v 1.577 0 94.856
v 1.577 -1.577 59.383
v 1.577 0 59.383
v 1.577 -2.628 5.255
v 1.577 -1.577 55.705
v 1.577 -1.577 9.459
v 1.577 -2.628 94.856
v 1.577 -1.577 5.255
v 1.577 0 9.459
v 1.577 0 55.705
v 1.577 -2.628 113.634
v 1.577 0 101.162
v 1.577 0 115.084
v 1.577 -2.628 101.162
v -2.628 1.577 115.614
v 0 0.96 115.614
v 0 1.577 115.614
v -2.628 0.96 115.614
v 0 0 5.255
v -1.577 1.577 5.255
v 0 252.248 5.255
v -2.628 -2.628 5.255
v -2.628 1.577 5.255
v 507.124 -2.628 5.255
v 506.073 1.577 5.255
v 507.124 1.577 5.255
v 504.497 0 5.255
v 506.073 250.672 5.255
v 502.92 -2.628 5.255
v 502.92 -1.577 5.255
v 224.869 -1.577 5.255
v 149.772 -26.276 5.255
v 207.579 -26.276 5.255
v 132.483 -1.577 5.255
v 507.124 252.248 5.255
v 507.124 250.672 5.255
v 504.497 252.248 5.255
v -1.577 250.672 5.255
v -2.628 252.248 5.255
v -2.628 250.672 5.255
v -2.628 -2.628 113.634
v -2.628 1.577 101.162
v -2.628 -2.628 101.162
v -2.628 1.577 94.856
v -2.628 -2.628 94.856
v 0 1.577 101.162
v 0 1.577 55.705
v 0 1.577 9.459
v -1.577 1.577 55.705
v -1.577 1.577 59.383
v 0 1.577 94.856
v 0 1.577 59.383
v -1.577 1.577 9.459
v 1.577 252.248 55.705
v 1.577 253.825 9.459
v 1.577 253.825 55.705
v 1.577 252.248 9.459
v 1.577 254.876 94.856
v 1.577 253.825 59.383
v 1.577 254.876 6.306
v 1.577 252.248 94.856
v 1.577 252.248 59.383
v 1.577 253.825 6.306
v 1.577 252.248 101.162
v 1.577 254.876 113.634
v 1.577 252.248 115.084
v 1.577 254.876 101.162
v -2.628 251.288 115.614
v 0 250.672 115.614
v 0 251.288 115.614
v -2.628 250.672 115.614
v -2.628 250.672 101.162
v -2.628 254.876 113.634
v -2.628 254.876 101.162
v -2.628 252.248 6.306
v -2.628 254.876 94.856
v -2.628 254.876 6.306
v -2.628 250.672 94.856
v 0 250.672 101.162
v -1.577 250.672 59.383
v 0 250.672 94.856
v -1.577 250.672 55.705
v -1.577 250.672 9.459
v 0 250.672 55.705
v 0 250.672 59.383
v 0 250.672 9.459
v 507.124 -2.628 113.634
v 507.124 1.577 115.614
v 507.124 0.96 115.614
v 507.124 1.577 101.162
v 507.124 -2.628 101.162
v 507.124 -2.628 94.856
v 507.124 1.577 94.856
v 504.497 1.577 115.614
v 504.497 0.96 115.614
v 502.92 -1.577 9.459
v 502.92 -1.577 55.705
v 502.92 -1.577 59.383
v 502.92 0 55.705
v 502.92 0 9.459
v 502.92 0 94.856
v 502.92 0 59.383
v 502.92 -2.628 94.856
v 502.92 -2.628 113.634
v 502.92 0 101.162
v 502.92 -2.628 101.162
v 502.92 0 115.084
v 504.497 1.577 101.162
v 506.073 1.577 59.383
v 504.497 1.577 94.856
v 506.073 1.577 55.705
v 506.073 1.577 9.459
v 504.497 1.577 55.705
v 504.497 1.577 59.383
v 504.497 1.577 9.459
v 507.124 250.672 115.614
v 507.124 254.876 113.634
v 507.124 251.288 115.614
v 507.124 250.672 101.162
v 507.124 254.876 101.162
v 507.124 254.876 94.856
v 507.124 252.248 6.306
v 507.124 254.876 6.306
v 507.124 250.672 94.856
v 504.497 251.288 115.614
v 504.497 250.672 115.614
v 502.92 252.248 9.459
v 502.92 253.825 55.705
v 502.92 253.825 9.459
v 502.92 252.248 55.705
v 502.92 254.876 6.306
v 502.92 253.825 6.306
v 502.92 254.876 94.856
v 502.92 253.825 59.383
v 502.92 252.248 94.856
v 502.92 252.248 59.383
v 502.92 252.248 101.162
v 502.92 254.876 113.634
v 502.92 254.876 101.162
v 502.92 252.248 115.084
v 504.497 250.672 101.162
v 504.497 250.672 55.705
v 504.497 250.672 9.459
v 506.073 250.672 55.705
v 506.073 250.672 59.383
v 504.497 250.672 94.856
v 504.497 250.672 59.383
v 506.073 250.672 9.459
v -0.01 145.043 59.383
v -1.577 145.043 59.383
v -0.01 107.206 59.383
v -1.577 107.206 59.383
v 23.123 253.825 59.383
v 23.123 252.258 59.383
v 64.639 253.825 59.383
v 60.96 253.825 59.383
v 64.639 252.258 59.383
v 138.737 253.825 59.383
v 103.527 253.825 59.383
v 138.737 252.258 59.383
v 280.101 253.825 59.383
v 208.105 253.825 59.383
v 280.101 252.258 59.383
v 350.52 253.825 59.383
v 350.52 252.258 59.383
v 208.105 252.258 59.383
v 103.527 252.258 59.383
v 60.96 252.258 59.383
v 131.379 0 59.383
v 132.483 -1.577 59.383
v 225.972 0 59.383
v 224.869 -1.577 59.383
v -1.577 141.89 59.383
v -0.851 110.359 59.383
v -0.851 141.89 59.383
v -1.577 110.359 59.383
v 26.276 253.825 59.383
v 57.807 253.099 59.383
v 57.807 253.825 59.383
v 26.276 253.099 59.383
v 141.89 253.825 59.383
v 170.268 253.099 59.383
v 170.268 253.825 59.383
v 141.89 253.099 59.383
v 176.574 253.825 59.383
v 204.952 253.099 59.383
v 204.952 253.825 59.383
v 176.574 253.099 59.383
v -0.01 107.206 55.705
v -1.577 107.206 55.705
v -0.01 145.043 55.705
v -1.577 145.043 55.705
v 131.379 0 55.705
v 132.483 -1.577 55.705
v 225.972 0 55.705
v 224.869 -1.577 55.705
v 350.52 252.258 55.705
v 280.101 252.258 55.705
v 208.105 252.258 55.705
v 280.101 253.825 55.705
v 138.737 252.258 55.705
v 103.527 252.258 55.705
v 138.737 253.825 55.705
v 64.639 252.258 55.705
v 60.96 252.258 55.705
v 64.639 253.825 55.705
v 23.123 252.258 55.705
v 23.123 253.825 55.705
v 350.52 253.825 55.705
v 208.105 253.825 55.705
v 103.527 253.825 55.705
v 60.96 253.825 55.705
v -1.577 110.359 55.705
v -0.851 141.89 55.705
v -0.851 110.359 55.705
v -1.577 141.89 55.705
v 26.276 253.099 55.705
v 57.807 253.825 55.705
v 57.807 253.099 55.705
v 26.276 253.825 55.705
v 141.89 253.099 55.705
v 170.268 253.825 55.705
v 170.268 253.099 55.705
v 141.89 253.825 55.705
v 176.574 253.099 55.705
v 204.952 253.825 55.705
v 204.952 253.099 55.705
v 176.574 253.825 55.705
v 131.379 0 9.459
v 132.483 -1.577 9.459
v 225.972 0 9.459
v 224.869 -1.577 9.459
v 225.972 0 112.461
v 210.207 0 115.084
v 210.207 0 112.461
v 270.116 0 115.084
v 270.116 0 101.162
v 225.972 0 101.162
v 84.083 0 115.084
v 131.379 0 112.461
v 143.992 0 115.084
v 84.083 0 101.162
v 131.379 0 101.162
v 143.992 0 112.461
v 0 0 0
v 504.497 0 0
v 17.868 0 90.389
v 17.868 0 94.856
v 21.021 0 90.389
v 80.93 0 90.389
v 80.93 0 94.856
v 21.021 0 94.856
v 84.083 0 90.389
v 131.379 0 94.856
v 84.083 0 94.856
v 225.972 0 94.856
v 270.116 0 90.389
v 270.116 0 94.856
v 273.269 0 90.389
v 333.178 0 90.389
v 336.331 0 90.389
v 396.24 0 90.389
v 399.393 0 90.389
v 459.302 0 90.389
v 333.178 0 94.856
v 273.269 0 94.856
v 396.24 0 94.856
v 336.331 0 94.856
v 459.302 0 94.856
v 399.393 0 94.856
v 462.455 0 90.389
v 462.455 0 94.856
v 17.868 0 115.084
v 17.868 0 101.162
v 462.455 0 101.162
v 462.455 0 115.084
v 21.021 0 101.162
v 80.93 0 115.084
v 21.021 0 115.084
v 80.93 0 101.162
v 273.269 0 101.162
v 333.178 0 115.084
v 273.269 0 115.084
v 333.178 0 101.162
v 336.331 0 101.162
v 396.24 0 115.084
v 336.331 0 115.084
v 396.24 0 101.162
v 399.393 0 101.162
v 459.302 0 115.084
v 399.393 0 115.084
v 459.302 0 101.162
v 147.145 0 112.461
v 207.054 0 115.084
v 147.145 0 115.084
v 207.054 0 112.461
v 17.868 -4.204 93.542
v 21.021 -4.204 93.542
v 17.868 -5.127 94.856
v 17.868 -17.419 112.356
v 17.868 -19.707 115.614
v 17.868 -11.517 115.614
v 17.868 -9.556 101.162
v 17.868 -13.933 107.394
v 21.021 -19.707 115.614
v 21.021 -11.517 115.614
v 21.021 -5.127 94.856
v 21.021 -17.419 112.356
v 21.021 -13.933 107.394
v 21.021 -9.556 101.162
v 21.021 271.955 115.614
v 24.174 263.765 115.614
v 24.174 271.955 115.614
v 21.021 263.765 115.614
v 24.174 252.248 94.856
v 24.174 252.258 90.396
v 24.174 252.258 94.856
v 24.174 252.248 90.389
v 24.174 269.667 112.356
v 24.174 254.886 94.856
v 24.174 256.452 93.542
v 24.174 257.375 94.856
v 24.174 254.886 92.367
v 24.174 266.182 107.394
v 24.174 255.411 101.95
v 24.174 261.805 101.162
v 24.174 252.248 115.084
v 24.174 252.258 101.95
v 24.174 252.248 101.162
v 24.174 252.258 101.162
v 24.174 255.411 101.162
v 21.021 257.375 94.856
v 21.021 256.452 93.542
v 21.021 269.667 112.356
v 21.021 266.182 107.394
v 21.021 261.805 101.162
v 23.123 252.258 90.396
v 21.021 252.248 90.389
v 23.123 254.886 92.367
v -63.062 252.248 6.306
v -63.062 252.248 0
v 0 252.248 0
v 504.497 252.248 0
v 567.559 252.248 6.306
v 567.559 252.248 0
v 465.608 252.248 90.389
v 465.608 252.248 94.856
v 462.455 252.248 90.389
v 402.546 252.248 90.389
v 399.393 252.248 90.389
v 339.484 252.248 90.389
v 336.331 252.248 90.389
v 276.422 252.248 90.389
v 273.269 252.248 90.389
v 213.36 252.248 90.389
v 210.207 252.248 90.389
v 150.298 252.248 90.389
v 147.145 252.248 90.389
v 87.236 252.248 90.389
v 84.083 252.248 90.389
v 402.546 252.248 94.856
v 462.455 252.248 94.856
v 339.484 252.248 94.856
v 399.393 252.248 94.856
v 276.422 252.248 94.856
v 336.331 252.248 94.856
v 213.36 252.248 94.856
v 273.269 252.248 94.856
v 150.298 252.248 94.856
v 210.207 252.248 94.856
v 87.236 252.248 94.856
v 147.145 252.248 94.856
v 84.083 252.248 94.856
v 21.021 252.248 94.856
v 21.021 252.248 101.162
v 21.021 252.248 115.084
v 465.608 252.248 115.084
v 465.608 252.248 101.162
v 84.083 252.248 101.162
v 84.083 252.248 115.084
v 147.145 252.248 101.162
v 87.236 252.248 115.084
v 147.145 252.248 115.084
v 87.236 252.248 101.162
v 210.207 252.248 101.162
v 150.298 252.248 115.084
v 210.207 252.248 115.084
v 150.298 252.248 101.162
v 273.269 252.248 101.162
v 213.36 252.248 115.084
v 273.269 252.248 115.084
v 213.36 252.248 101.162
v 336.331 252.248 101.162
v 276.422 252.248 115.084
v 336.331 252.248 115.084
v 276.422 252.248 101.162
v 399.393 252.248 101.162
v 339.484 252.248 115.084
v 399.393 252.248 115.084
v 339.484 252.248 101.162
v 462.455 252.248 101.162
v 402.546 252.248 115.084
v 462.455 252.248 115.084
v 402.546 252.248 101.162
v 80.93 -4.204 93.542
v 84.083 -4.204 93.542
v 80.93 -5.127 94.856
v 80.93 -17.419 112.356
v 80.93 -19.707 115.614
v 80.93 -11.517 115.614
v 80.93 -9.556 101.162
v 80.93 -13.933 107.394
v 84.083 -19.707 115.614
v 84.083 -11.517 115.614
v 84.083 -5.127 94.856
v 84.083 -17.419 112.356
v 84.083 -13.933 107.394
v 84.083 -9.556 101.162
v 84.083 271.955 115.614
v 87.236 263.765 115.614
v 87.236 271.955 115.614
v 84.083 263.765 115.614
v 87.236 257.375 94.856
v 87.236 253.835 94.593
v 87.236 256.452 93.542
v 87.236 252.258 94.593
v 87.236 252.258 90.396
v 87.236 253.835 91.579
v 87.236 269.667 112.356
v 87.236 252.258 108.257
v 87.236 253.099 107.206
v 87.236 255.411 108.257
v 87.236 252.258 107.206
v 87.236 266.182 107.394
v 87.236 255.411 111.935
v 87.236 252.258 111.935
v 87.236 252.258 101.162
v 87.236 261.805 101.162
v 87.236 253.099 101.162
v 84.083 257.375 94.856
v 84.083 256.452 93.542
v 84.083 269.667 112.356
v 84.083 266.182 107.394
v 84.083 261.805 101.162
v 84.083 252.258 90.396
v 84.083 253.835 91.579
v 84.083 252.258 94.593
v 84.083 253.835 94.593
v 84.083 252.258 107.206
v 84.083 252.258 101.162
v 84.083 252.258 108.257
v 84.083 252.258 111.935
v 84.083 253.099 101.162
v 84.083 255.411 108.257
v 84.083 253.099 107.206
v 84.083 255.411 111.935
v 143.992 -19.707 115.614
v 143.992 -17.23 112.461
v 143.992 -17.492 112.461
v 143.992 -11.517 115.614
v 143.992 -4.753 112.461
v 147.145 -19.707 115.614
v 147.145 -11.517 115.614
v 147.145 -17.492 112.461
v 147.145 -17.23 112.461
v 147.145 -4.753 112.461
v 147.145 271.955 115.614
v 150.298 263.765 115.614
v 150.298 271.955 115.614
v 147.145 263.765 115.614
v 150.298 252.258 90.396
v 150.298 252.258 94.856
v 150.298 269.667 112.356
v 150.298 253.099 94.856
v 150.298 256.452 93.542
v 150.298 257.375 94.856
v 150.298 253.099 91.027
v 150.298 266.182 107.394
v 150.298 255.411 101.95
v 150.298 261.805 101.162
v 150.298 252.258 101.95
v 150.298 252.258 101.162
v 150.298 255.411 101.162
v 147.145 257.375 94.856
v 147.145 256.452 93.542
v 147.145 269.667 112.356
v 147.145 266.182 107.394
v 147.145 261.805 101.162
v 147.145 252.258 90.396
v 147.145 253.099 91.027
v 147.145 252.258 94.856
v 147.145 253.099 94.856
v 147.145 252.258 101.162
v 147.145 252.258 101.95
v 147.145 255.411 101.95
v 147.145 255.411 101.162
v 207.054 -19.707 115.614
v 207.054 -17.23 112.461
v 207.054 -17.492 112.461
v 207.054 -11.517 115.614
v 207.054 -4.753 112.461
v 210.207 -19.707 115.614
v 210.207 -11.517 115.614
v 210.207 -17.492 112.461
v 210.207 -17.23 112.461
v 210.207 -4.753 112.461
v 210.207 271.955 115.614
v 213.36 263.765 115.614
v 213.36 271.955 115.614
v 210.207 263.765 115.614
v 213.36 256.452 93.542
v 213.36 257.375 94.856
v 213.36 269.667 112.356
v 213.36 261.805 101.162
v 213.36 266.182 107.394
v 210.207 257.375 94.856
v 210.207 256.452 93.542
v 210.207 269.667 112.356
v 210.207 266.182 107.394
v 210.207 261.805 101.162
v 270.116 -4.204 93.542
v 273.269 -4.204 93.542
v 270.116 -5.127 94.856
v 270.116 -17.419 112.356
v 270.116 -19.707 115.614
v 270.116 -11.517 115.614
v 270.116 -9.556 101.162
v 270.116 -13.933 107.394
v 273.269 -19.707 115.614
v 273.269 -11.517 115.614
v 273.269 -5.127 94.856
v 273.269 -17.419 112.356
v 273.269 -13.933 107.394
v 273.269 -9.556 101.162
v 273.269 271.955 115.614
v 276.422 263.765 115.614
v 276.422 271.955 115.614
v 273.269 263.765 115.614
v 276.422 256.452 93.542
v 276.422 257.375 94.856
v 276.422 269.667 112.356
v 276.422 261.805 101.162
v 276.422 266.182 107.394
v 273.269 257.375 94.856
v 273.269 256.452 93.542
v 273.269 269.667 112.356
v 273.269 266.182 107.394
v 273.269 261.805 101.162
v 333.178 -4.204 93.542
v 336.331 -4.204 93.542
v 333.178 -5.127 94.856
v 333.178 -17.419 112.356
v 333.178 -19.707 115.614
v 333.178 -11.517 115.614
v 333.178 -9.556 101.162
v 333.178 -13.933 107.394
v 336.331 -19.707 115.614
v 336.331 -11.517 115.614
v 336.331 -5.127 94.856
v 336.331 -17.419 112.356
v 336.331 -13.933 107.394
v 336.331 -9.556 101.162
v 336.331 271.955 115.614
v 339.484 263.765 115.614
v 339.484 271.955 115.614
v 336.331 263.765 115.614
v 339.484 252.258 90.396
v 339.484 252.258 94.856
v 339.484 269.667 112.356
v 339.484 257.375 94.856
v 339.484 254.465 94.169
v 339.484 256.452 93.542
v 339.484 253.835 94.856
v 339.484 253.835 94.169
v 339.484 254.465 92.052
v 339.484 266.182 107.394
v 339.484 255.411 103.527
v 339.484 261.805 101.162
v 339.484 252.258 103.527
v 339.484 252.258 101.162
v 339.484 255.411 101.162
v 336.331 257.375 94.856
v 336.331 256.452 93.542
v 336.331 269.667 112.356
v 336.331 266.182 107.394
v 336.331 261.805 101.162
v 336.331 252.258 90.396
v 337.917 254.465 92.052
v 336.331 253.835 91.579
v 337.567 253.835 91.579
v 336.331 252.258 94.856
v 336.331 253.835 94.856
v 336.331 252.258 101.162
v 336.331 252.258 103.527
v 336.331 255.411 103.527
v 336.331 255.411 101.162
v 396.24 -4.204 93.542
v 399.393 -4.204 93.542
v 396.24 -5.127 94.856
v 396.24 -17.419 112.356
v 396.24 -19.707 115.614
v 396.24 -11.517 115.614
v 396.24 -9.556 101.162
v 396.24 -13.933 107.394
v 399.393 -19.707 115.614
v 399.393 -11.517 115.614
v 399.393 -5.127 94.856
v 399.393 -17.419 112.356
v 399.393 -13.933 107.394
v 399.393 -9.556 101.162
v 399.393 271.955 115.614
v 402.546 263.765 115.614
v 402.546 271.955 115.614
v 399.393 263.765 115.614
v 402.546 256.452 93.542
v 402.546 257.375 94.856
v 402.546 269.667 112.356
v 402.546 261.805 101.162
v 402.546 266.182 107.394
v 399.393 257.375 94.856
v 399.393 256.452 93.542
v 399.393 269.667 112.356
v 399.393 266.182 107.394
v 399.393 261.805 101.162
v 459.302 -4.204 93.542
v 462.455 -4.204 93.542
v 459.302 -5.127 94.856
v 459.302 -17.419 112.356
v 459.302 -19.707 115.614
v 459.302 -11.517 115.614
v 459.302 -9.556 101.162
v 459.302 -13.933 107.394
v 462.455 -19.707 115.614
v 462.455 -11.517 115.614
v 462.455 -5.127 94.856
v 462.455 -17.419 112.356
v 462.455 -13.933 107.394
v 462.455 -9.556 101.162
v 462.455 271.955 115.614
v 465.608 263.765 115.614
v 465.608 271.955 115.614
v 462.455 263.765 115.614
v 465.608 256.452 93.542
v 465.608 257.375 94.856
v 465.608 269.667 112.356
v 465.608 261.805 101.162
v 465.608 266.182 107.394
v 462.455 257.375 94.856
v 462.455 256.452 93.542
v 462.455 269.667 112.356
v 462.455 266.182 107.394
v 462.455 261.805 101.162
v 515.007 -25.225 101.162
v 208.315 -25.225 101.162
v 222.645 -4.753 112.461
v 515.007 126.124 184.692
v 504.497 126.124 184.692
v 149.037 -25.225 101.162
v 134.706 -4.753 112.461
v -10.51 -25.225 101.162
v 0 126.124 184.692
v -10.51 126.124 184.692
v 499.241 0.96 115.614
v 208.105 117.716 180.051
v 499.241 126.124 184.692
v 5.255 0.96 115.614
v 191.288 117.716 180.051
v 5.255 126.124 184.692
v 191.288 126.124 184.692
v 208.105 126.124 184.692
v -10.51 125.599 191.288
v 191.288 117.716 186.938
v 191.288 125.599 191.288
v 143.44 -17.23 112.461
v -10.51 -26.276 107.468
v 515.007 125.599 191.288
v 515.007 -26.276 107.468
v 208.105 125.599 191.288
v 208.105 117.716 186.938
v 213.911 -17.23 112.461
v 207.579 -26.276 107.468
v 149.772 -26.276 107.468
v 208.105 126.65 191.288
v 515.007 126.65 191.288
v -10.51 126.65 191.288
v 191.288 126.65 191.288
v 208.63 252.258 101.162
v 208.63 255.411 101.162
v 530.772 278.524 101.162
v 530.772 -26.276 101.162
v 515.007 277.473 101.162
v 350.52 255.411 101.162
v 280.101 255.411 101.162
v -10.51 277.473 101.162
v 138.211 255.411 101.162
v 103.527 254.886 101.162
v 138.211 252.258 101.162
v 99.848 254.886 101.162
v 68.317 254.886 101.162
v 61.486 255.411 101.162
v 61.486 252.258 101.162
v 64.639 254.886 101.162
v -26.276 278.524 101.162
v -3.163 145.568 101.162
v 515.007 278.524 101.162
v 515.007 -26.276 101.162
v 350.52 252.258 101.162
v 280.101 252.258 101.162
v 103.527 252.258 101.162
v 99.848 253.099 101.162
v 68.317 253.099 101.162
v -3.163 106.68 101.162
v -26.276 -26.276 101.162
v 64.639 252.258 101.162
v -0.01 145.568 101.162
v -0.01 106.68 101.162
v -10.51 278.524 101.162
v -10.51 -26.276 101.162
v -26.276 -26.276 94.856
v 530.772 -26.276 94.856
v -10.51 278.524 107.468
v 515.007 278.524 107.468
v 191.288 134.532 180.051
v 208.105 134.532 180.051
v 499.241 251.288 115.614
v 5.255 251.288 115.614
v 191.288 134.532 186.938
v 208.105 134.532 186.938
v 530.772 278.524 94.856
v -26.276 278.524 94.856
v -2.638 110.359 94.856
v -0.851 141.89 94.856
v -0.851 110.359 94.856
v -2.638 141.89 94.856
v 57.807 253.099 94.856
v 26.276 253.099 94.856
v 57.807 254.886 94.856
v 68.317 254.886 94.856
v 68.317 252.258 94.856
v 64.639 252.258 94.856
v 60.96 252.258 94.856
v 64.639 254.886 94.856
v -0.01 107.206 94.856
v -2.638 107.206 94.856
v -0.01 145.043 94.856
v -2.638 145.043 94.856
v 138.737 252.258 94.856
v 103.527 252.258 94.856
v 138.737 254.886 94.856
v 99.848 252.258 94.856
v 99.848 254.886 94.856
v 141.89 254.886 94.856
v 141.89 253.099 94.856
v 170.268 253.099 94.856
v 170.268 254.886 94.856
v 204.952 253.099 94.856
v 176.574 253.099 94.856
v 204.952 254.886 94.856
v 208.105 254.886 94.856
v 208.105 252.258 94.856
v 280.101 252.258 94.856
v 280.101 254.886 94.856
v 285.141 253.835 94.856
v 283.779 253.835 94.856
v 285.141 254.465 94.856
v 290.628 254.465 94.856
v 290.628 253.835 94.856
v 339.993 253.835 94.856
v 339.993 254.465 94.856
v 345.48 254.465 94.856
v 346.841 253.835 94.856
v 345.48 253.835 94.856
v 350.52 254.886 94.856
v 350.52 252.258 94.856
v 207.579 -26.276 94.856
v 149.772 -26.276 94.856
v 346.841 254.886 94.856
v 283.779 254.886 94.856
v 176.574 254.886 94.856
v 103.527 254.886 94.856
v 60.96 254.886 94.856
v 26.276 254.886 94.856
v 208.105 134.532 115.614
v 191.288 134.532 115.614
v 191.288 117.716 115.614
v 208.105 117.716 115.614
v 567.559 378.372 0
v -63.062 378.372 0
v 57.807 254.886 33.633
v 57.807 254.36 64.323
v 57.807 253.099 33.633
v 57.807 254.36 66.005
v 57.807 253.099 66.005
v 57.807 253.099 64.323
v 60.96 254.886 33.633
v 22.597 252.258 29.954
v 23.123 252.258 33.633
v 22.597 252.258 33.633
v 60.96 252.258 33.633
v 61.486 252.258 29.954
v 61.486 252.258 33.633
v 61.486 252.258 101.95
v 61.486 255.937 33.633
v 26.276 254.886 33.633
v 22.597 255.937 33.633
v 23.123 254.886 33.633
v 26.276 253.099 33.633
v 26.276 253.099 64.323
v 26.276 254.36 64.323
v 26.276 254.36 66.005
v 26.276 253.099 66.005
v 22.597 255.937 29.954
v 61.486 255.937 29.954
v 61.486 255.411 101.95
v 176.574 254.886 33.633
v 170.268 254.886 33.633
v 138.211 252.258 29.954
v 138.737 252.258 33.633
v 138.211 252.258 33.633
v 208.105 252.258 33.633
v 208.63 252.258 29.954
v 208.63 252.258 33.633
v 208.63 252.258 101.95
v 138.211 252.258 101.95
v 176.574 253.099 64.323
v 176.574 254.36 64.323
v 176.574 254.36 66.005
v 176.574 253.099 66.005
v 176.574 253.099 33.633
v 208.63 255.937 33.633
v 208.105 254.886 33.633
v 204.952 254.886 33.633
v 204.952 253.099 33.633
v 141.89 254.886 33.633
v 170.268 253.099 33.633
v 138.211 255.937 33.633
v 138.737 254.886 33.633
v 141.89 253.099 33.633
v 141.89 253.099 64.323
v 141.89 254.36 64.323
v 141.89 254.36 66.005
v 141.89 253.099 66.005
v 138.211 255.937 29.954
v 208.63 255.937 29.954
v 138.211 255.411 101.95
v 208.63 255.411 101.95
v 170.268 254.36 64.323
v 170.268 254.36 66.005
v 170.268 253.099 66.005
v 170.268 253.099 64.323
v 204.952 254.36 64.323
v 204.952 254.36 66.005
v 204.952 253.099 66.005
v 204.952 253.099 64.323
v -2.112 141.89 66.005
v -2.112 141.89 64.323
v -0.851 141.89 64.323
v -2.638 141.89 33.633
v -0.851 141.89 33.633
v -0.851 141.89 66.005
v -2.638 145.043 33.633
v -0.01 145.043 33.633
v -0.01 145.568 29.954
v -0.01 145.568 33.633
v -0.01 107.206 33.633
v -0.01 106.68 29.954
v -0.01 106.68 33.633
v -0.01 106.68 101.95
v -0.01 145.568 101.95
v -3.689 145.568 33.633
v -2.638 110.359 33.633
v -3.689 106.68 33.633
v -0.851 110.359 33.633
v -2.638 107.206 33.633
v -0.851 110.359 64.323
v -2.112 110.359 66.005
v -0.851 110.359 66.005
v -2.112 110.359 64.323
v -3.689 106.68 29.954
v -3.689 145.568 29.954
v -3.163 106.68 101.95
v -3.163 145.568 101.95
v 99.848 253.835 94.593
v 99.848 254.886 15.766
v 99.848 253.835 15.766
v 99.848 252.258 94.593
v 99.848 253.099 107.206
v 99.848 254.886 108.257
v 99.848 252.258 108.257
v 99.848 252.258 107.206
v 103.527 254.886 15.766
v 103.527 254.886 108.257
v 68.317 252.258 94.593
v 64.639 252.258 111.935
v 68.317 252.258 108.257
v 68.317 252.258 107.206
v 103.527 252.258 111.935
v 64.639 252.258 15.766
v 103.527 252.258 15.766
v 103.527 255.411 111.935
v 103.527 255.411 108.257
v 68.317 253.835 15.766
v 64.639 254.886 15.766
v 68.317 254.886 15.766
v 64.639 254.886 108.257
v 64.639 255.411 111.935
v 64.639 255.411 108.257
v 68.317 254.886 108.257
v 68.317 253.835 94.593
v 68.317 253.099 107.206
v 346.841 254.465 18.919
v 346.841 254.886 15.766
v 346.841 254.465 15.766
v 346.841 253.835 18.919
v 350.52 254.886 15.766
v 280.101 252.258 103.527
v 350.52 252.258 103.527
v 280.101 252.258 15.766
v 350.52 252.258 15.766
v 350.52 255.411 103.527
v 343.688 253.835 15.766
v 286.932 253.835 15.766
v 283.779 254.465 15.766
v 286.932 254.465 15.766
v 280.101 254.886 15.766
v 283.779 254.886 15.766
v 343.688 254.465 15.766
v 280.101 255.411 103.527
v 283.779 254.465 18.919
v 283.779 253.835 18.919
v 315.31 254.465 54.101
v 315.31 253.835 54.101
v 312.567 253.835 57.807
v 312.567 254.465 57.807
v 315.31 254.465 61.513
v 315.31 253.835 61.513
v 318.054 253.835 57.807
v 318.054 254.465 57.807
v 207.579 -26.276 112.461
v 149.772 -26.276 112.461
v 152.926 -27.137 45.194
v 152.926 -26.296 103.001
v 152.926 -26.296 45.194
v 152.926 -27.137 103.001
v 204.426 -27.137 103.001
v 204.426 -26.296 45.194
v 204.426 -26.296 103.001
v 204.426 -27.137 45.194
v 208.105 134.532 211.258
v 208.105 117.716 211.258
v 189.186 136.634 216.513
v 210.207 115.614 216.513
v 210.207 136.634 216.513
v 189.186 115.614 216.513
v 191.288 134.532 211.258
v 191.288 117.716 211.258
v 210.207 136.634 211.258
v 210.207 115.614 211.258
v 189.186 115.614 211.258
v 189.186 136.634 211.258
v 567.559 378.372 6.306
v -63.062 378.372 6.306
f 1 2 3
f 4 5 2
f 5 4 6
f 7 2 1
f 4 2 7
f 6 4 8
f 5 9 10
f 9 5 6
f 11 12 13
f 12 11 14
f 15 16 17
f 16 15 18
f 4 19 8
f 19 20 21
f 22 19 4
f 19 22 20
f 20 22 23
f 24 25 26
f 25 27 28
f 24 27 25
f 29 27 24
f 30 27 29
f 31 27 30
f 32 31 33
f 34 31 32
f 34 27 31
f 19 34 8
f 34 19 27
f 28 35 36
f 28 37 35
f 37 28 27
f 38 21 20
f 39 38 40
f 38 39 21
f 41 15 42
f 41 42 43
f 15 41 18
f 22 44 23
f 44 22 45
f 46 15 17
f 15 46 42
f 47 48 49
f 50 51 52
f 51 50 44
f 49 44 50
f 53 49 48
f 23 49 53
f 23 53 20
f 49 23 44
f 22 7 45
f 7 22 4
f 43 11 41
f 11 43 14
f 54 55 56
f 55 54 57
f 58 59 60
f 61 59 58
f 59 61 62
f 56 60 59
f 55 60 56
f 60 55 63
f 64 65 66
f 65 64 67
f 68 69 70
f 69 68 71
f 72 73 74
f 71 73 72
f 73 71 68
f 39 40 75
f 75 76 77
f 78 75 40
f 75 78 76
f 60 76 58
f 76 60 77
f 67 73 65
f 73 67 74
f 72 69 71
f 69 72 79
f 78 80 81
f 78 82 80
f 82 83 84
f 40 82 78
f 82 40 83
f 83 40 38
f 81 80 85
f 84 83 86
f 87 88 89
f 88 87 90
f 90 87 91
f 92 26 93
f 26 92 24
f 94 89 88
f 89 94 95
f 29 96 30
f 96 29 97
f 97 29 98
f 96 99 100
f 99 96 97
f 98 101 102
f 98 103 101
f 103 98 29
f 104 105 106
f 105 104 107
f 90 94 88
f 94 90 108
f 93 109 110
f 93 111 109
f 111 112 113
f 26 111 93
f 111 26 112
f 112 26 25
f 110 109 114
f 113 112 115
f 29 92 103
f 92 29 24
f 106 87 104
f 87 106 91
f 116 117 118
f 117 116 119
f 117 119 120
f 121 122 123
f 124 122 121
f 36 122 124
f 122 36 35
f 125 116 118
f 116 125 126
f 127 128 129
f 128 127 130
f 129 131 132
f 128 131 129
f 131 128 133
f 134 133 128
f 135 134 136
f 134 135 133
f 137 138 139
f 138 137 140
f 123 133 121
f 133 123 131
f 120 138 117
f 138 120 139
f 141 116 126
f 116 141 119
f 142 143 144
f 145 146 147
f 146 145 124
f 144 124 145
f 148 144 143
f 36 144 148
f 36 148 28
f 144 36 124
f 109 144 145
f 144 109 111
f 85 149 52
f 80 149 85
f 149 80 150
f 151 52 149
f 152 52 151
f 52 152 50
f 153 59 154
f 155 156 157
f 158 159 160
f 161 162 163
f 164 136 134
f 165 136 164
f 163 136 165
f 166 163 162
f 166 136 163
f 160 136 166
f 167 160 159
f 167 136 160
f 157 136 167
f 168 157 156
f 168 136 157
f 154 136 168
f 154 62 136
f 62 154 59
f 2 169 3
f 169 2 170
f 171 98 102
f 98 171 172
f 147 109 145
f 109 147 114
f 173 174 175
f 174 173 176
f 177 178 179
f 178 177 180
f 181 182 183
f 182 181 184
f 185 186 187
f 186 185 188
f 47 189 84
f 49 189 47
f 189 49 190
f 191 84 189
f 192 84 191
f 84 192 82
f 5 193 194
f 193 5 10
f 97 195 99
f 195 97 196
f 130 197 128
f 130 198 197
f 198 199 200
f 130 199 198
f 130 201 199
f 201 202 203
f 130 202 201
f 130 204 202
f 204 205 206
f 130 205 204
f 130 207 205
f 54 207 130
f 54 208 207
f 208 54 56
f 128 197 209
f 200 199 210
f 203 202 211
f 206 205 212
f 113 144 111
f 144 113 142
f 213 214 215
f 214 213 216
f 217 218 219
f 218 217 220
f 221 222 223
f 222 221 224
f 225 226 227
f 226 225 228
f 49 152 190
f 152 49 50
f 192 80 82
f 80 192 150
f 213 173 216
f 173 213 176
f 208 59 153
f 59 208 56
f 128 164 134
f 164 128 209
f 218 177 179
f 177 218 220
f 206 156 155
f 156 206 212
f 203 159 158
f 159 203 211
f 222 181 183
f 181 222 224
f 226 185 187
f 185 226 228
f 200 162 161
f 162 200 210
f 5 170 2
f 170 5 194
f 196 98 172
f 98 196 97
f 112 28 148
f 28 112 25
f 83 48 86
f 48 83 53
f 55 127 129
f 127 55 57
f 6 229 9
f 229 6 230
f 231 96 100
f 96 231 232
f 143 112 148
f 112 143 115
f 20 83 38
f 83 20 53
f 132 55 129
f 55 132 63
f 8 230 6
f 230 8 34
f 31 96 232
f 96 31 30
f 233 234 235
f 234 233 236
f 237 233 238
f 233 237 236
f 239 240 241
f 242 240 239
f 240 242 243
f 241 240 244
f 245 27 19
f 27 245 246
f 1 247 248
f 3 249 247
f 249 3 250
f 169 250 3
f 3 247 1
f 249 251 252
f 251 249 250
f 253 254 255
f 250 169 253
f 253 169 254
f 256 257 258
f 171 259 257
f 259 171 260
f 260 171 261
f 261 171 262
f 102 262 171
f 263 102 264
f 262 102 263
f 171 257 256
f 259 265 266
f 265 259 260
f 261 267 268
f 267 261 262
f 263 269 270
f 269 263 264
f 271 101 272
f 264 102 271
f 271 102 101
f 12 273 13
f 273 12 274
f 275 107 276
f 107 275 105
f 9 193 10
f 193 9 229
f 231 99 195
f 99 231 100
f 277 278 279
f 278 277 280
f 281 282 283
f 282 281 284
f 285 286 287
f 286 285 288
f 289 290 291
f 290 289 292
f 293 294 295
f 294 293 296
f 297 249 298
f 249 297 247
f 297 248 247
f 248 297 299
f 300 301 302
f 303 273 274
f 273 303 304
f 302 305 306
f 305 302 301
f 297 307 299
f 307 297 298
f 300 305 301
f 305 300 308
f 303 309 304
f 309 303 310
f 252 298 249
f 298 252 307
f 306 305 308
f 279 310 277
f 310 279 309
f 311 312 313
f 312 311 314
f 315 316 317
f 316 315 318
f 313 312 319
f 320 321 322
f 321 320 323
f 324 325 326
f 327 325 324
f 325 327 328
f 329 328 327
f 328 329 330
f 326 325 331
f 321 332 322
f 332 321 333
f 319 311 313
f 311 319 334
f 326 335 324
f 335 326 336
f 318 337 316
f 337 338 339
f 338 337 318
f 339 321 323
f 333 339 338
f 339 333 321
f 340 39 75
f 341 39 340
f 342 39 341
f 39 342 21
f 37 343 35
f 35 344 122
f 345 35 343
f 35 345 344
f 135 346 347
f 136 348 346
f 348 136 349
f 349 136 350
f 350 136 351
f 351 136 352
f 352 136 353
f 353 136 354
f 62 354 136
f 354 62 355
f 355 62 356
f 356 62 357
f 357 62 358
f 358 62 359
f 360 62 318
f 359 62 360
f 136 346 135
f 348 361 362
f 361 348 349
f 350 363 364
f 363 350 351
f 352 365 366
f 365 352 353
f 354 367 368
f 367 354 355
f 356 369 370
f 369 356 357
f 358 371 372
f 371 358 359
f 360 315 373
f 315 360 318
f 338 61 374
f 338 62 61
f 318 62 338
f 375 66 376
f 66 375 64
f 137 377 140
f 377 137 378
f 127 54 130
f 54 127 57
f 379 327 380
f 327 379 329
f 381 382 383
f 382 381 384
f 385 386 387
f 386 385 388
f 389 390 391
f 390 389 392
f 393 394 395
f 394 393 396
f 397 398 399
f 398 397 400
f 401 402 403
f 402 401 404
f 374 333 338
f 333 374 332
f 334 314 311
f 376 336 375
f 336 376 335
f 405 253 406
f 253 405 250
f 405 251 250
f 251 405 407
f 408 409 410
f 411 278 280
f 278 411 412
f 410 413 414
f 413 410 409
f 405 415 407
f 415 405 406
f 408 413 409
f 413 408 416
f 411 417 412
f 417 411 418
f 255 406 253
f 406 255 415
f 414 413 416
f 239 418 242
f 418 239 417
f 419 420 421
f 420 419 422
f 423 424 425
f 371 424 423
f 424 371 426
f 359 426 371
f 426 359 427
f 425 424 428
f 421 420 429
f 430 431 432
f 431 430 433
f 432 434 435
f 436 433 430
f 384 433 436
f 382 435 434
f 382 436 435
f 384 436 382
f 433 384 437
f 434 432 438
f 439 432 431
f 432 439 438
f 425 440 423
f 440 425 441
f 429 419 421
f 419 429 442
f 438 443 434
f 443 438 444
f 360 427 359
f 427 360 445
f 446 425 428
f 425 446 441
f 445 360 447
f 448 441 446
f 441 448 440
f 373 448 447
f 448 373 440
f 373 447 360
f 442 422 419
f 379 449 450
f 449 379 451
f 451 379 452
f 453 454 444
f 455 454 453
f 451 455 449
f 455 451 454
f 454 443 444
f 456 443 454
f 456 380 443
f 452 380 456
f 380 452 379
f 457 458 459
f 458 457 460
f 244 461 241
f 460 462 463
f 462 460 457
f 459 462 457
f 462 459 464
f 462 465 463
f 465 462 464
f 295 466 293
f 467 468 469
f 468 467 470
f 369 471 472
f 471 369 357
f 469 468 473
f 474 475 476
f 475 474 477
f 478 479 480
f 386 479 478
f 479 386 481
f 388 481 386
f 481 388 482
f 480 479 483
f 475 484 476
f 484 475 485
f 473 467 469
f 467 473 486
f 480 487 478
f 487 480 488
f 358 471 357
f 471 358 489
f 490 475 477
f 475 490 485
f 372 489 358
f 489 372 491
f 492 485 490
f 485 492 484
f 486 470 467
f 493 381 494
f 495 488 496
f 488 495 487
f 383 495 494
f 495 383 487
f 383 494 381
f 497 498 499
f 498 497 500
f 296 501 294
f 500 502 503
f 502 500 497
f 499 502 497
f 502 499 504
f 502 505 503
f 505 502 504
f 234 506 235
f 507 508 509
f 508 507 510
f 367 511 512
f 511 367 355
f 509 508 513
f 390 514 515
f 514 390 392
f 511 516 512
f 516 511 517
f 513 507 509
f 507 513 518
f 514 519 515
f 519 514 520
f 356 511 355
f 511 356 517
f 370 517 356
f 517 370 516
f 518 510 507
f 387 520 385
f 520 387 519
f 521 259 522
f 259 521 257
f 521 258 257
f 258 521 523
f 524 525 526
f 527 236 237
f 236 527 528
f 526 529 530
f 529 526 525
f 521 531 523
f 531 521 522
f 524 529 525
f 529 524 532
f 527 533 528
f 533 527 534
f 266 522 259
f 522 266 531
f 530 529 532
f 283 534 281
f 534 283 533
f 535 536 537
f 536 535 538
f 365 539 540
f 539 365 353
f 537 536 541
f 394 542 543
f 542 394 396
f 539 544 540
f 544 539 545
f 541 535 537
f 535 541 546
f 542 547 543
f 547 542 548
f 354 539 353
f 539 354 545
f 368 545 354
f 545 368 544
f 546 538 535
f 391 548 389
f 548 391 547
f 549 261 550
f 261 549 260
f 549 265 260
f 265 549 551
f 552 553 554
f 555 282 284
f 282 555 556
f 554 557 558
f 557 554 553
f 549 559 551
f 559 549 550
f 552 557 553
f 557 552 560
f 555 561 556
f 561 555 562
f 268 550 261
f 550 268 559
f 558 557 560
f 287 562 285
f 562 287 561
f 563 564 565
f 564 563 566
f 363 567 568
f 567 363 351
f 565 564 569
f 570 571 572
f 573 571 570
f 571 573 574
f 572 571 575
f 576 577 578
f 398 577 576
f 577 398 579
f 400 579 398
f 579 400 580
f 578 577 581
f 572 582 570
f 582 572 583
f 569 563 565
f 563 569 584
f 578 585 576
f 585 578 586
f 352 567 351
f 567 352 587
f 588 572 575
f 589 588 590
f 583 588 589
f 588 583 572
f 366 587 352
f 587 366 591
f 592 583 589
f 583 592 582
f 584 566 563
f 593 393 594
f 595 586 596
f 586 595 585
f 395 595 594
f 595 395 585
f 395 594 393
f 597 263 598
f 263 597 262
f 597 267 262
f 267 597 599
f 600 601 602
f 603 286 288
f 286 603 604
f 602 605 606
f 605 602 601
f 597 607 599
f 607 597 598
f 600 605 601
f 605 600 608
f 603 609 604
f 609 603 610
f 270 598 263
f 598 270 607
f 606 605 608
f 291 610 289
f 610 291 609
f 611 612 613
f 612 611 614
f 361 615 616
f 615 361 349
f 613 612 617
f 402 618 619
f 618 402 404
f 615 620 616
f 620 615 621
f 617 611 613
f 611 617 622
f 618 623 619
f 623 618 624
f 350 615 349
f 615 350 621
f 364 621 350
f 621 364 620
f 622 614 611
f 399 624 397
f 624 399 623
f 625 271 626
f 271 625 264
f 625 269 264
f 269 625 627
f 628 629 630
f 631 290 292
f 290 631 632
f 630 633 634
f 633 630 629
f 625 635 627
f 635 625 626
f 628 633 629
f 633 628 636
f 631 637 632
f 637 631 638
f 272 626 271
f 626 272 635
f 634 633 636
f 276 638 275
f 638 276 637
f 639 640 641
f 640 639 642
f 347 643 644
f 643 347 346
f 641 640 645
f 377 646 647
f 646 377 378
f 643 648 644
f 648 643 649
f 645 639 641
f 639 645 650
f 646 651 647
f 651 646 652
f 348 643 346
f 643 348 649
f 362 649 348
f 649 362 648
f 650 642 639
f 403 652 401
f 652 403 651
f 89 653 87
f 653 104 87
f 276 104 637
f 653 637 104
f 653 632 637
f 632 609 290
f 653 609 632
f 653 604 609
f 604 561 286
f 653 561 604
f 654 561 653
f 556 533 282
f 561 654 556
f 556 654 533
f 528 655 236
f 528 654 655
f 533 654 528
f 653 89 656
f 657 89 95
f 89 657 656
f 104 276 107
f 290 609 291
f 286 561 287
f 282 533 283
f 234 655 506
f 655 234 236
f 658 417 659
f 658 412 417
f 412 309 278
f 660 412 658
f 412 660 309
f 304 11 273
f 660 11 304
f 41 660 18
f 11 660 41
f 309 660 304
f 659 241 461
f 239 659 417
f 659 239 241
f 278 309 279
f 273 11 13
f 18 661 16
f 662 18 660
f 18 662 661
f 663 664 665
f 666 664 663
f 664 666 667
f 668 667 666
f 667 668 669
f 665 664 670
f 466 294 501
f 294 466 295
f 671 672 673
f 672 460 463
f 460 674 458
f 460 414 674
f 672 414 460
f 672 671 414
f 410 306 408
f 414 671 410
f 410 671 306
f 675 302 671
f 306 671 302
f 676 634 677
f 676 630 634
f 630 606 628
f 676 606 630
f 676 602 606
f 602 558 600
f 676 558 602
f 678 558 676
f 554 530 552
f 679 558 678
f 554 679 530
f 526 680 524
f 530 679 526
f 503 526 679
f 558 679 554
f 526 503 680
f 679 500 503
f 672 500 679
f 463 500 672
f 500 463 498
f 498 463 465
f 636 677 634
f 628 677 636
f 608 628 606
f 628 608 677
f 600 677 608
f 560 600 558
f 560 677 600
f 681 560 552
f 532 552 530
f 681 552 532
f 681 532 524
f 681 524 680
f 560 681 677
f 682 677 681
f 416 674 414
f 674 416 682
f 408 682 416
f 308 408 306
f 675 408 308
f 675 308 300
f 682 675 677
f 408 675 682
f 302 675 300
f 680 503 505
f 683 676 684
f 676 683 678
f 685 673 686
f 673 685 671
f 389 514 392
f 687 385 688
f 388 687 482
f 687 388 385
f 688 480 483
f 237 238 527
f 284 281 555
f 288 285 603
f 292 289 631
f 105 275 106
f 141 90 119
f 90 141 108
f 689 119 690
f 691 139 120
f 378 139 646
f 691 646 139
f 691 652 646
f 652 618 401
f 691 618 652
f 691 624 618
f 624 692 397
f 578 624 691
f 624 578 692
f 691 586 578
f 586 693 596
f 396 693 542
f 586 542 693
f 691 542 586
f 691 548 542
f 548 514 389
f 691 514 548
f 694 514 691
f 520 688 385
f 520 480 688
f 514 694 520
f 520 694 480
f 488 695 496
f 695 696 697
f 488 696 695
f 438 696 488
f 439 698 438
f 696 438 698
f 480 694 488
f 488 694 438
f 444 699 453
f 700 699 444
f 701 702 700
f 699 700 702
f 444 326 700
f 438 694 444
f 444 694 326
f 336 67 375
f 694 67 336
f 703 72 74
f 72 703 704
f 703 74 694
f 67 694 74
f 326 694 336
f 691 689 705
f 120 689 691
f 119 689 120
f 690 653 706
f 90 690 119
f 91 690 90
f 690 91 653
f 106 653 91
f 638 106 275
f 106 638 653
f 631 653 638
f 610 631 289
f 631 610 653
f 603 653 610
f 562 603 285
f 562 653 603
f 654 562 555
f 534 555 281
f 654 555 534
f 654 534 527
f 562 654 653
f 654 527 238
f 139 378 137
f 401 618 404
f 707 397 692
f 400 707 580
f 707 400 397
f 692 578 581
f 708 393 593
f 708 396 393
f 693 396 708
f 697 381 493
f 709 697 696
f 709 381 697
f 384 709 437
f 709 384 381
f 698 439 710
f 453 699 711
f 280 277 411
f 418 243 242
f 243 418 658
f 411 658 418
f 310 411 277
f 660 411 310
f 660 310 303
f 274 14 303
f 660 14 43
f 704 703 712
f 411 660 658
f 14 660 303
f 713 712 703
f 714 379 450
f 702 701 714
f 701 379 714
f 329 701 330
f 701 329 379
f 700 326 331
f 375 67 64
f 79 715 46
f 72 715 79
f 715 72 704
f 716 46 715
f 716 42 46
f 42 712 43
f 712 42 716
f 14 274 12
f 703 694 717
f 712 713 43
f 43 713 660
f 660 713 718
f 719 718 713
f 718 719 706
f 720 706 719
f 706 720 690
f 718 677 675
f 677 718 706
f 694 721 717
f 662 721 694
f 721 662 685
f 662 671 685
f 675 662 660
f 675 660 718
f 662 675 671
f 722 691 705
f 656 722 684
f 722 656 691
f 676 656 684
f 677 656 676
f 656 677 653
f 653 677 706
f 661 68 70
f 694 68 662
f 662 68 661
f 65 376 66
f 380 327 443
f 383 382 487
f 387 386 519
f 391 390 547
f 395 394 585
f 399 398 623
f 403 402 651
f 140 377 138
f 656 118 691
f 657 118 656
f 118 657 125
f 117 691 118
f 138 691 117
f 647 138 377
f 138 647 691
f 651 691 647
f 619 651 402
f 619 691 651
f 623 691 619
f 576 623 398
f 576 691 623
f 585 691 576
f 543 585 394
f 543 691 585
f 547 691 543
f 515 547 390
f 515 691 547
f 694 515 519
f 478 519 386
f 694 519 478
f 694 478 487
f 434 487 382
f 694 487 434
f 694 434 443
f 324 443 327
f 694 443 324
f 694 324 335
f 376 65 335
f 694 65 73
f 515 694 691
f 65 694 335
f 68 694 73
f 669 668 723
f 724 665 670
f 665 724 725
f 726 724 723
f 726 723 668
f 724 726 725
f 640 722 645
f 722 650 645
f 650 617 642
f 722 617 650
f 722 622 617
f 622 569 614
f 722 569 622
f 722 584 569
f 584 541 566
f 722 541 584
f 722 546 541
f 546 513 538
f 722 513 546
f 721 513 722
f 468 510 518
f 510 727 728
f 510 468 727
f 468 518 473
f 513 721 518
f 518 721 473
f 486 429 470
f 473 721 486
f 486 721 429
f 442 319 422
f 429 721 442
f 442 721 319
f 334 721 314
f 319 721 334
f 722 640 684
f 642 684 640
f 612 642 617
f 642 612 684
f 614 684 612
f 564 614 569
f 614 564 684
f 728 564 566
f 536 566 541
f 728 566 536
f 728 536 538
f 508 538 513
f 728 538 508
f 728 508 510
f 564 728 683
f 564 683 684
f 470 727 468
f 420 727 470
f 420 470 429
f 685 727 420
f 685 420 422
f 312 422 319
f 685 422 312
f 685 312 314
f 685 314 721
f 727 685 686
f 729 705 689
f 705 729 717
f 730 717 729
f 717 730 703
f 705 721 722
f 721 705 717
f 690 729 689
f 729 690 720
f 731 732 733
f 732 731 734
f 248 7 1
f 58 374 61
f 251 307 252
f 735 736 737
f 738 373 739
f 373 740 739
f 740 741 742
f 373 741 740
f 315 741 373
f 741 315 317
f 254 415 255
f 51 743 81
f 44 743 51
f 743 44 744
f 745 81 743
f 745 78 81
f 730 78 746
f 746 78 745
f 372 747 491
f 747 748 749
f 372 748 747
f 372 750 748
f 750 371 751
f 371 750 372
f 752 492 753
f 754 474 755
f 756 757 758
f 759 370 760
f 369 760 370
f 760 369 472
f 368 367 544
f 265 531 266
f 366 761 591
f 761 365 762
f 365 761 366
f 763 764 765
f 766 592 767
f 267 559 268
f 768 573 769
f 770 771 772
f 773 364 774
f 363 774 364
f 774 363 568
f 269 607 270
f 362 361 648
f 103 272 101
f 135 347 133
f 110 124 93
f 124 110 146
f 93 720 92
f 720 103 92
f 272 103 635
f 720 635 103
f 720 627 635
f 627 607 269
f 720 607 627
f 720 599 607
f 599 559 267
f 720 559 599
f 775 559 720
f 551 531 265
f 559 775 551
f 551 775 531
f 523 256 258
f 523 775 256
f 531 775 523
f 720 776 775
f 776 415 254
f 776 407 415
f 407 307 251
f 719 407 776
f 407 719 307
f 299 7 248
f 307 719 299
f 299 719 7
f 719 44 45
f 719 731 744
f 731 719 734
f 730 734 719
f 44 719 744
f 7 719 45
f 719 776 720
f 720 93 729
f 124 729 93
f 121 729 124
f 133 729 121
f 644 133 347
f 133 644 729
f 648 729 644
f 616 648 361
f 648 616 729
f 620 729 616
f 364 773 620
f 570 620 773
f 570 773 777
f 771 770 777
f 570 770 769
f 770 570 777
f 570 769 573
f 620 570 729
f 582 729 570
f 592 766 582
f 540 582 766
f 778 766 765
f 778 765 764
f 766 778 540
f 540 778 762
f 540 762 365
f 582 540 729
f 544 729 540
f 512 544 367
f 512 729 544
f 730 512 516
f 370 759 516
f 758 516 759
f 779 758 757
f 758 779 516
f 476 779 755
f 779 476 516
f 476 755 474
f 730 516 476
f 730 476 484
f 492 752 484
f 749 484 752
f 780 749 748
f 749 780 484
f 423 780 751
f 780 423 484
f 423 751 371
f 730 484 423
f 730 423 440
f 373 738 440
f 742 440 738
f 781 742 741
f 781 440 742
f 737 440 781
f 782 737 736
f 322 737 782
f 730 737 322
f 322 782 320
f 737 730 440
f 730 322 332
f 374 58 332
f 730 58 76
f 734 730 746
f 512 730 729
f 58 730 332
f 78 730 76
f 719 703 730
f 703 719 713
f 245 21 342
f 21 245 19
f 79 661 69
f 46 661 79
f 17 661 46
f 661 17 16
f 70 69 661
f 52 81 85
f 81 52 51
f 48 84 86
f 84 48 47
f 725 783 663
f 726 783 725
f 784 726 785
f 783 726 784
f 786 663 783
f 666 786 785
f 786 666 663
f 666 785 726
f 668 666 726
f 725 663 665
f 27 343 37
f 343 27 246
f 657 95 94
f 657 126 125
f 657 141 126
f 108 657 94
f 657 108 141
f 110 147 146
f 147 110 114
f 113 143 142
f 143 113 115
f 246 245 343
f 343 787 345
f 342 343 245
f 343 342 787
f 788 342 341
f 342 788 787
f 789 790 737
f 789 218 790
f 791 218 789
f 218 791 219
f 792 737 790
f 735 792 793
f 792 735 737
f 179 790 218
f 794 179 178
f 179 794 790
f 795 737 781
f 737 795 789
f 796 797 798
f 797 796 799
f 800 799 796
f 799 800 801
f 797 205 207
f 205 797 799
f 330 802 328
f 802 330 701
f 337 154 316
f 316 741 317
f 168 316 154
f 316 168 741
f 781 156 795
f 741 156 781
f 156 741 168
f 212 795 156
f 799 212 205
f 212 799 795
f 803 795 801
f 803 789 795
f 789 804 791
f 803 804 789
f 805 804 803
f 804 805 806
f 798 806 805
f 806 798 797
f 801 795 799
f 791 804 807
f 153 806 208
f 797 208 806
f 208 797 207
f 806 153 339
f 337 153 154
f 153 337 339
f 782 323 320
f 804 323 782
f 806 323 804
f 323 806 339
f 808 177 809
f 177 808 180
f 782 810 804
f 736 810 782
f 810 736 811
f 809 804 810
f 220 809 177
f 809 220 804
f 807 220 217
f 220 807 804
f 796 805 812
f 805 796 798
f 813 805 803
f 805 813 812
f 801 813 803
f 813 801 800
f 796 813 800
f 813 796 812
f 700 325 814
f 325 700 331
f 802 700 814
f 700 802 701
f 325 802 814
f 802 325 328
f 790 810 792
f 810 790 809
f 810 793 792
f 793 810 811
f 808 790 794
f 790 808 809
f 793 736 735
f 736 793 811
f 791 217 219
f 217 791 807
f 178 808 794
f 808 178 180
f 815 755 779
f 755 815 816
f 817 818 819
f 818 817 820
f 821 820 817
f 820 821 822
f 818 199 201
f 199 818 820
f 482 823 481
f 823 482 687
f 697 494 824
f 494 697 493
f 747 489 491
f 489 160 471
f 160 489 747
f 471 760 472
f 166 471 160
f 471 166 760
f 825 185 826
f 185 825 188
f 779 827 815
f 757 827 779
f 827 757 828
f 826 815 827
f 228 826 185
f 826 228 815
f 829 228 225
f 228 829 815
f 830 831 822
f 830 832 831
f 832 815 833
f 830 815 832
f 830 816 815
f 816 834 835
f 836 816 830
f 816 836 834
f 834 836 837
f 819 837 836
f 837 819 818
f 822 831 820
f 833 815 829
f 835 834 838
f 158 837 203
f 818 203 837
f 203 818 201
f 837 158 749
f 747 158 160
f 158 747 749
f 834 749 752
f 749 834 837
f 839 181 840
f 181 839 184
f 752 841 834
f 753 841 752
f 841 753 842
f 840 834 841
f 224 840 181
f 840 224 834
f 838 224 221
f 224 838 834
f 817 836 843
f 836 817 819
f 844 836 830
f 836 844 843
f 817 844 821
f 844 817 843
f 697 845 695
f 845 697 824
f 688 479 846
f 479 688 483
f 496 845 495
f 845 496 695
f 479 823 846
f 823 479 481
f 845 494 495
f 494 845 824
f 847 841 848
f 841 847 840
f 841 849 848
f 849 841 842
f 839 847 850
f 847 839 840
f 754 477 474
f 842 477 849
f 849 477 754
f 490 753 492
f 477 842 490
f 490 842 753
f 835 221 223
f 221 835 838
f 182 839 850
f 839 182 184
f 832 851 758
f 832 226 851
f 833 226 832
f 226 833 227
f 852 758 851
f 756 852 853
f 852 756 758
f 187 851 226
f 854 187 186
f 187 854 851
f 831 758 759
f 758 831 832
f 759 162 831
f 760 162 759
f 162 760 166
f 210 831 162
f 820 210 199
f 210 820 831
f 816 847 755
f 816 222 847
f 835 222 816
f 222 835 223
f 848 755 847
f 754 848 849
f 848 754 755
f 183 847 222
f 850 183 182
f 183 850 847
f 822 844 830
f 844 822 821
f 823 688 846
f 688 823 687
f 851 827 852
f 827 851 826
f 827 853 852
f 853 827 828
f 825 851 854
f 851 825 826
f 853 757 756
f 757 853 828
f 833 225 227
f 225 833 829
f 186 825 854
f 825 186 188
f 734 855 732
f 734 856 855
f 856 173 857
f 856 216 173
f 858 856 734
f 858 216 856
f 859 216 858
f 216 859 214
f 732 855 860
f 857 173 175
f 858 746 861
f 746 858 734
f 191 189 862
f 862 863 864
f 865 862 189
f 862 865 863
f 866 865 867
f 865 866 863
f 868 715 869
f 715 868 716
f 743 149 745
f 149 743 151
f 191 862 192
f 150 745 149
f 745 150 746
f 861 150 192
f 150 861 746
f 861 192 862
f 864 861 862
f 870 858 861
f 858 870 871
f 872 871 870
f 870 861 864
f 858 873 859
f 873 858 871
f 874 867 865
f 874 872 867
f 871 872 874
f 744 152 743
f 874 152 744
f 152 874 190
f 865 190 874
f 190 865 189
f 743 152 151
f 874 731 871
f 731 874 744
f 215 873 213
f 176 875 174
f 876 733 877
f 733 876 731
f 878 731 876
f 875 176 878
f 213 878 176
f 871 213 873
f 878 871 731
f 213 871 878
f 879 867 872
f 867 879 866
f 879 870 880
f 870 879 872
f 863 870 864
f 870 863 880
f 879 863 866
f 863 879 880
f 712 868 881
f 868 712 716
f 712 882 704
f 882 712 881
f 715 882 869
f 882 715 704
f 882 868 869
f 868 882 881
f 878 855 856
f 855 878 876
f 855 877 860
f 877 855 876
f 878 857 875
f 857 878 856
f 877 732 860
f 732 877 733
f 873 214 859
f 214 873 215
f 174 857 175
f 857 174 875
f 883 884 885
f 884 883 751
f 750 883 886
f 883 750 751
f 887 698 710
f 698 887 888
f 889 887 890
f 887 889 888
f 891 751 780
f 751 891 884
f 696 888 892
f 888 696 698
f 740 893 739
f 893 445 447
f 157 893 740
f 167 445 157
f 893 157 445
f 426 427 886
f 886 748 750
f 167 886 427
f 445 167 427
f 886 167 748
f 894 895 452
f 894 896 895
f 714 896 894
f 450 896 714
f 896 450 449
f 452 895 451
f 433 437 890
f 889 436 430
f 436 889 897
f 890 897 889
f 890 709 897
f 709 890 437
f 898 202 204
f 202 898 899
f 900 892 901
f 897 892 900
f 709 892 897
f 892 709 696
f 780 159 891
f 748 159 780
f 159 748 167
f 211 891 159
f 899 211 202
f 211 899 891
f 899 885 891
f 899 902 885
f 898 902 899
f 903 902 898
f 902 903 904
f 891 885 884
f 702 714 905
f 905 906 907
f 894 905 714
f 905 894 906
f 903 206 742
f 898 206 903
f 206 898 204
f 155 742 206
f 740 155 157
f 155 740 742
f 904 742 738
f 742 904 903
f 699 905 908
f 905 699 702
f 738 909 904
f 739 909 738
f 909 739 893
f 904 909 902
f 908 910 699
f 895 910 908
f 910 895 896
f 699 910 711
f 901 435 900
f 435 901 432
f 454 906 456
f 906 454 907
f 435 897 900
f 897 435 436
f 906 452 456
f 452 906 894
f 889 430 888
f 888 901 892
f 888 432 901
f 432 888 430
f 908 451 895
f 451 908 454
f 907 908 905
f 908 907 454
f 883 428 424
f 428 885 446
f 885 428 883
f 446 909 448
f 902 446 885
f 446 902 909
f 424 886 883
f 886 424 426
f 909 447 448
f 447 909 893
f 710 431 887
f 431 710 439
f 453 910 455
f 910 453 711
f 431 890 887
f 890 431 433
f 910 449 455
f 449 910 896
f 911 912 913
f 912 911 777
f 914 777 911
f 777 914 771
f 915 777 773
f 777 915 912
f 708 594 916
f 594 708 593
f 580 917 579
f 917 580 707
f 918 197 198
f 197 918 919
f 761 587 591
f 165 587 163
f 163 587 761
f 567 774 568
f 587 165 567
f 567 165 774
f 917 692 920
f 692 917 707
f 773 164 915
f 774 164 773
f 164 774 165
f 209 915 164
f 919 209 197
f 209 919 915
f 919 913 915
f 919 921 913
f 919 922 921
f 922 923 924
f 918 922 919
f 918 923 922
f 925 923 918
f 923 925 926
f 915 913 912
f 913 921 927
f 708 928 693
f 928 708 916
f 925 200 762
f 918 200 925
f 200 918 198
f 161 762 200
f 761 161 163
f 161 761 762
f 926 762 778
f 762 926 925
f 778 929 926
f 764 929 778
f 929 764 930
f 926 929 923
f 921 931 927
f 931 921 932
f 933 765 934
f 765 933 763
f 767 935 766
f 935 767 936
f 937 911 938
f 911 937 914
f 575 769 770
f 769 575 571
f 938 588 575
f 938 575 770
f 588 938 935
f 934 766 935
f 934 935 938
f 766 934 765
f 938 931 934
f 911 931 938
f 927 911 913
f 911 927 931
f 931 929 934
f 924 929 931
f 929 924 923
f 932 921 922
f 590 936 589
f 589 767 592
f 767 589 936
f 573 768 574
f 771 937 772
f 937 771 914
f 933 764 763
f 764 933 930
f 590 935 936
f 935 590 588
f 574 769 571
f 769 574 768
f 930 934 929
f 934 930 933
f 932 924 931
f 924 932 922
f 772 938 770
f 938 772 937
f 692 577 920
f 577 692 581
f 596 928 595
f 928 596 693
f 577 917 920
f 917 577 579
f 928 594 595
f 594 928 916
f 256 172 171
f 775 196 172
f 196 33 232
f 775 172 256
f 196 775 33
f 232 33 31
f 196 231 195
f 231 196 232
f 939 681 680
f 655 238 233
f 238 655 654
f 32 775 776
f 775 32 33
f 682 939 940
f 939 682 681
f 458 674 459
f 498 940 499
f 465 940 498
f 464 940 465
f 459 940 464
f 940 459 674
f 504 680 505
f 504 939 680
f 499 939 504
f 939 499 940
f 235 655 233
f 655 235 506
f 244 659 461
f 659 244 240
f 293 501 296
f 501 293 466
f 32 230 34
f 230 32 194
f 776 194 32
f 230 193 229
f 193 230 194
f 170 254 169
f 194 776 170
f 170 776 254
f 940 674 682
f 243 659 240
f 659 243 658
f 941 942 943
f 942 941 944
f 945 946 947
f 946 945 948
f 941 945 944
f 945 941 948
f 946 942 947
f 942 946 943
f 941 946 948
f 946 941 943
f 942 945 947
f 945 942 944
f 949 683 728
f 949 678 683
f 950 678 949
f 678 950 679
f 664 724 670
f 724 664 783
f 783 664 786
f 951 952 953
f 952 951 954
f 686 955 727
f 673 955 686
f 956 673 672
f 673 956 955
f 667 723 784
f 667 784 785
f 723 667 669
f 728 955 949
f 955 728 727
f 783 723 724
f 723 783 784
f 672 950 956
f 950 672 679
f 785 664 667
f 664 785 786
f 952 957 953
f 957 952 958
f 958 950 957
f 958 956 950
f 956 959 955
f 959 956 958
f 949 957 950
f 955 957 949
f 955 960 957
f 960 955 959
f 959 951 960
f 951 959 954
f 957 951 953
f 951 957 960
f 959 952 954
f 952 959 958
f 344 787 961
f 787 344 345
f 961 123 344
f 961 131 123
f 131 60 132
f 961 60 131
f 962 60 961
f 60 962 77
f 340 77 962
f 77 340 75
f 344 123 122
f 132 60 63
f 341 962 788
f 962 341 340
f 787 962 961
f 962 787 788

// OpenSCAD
// =====================================================================
//  MILWAUKEE ROAD - STANDARD 24 X 48 FT DEPOT (C.M.&ST.P., NOV 1898)
//  Album of Depot Plans (1919), sheet 06. Private reference (in copyright):
//  Research Library / RSW / Stations / Standard depots / Album of Depot Plans 1919.
//  Rib Side Works, 24 Nov 2026. FIRST SHAPE MODEL for review - not cut into print sections.
//  KNOWN (from the sheet): 24 x 48 ft; waiting room 18 ft 6, office 14 with bay, freight room 28; shingle roof with cresting, drop siding; built at Grafton, Stiles, Walford and Nekoosa.
//  ESTIMATE: wall and ridge heights (sheets are small copies), window spacing, colours.
//  Shared depot builder ../../../_common/rsw_depot.scad (x along the track, y = 0 town side,
//  track side +y, feet).  SCALE: 29 = G, 48 = O, 87 = HO.
// =====================================================================
SCALE = 29;
include <../../../_common/rsw_depot.scad>

depot(blocks = [[0, 48, 0, 24, 11, 0.55, 1, 2.5, 0]],
      pavs   = [],
      wins   = [[4, 1, 3, 6, 3.2], [15, 1, 3, 6, 3.2], [18, 1, 3, 6, 3.2], [12, 2, 3, 6, 3.2]],
      doors  = [[8, 1, 3, 7.5, 0], [30, 1, 6, 8, 2]],
      bays   = [[17, 0, 9, 2.5]],
      chims  = [[19, 12, 20.6]],
      plat   = [-6, 60, 12, 0.6]);
